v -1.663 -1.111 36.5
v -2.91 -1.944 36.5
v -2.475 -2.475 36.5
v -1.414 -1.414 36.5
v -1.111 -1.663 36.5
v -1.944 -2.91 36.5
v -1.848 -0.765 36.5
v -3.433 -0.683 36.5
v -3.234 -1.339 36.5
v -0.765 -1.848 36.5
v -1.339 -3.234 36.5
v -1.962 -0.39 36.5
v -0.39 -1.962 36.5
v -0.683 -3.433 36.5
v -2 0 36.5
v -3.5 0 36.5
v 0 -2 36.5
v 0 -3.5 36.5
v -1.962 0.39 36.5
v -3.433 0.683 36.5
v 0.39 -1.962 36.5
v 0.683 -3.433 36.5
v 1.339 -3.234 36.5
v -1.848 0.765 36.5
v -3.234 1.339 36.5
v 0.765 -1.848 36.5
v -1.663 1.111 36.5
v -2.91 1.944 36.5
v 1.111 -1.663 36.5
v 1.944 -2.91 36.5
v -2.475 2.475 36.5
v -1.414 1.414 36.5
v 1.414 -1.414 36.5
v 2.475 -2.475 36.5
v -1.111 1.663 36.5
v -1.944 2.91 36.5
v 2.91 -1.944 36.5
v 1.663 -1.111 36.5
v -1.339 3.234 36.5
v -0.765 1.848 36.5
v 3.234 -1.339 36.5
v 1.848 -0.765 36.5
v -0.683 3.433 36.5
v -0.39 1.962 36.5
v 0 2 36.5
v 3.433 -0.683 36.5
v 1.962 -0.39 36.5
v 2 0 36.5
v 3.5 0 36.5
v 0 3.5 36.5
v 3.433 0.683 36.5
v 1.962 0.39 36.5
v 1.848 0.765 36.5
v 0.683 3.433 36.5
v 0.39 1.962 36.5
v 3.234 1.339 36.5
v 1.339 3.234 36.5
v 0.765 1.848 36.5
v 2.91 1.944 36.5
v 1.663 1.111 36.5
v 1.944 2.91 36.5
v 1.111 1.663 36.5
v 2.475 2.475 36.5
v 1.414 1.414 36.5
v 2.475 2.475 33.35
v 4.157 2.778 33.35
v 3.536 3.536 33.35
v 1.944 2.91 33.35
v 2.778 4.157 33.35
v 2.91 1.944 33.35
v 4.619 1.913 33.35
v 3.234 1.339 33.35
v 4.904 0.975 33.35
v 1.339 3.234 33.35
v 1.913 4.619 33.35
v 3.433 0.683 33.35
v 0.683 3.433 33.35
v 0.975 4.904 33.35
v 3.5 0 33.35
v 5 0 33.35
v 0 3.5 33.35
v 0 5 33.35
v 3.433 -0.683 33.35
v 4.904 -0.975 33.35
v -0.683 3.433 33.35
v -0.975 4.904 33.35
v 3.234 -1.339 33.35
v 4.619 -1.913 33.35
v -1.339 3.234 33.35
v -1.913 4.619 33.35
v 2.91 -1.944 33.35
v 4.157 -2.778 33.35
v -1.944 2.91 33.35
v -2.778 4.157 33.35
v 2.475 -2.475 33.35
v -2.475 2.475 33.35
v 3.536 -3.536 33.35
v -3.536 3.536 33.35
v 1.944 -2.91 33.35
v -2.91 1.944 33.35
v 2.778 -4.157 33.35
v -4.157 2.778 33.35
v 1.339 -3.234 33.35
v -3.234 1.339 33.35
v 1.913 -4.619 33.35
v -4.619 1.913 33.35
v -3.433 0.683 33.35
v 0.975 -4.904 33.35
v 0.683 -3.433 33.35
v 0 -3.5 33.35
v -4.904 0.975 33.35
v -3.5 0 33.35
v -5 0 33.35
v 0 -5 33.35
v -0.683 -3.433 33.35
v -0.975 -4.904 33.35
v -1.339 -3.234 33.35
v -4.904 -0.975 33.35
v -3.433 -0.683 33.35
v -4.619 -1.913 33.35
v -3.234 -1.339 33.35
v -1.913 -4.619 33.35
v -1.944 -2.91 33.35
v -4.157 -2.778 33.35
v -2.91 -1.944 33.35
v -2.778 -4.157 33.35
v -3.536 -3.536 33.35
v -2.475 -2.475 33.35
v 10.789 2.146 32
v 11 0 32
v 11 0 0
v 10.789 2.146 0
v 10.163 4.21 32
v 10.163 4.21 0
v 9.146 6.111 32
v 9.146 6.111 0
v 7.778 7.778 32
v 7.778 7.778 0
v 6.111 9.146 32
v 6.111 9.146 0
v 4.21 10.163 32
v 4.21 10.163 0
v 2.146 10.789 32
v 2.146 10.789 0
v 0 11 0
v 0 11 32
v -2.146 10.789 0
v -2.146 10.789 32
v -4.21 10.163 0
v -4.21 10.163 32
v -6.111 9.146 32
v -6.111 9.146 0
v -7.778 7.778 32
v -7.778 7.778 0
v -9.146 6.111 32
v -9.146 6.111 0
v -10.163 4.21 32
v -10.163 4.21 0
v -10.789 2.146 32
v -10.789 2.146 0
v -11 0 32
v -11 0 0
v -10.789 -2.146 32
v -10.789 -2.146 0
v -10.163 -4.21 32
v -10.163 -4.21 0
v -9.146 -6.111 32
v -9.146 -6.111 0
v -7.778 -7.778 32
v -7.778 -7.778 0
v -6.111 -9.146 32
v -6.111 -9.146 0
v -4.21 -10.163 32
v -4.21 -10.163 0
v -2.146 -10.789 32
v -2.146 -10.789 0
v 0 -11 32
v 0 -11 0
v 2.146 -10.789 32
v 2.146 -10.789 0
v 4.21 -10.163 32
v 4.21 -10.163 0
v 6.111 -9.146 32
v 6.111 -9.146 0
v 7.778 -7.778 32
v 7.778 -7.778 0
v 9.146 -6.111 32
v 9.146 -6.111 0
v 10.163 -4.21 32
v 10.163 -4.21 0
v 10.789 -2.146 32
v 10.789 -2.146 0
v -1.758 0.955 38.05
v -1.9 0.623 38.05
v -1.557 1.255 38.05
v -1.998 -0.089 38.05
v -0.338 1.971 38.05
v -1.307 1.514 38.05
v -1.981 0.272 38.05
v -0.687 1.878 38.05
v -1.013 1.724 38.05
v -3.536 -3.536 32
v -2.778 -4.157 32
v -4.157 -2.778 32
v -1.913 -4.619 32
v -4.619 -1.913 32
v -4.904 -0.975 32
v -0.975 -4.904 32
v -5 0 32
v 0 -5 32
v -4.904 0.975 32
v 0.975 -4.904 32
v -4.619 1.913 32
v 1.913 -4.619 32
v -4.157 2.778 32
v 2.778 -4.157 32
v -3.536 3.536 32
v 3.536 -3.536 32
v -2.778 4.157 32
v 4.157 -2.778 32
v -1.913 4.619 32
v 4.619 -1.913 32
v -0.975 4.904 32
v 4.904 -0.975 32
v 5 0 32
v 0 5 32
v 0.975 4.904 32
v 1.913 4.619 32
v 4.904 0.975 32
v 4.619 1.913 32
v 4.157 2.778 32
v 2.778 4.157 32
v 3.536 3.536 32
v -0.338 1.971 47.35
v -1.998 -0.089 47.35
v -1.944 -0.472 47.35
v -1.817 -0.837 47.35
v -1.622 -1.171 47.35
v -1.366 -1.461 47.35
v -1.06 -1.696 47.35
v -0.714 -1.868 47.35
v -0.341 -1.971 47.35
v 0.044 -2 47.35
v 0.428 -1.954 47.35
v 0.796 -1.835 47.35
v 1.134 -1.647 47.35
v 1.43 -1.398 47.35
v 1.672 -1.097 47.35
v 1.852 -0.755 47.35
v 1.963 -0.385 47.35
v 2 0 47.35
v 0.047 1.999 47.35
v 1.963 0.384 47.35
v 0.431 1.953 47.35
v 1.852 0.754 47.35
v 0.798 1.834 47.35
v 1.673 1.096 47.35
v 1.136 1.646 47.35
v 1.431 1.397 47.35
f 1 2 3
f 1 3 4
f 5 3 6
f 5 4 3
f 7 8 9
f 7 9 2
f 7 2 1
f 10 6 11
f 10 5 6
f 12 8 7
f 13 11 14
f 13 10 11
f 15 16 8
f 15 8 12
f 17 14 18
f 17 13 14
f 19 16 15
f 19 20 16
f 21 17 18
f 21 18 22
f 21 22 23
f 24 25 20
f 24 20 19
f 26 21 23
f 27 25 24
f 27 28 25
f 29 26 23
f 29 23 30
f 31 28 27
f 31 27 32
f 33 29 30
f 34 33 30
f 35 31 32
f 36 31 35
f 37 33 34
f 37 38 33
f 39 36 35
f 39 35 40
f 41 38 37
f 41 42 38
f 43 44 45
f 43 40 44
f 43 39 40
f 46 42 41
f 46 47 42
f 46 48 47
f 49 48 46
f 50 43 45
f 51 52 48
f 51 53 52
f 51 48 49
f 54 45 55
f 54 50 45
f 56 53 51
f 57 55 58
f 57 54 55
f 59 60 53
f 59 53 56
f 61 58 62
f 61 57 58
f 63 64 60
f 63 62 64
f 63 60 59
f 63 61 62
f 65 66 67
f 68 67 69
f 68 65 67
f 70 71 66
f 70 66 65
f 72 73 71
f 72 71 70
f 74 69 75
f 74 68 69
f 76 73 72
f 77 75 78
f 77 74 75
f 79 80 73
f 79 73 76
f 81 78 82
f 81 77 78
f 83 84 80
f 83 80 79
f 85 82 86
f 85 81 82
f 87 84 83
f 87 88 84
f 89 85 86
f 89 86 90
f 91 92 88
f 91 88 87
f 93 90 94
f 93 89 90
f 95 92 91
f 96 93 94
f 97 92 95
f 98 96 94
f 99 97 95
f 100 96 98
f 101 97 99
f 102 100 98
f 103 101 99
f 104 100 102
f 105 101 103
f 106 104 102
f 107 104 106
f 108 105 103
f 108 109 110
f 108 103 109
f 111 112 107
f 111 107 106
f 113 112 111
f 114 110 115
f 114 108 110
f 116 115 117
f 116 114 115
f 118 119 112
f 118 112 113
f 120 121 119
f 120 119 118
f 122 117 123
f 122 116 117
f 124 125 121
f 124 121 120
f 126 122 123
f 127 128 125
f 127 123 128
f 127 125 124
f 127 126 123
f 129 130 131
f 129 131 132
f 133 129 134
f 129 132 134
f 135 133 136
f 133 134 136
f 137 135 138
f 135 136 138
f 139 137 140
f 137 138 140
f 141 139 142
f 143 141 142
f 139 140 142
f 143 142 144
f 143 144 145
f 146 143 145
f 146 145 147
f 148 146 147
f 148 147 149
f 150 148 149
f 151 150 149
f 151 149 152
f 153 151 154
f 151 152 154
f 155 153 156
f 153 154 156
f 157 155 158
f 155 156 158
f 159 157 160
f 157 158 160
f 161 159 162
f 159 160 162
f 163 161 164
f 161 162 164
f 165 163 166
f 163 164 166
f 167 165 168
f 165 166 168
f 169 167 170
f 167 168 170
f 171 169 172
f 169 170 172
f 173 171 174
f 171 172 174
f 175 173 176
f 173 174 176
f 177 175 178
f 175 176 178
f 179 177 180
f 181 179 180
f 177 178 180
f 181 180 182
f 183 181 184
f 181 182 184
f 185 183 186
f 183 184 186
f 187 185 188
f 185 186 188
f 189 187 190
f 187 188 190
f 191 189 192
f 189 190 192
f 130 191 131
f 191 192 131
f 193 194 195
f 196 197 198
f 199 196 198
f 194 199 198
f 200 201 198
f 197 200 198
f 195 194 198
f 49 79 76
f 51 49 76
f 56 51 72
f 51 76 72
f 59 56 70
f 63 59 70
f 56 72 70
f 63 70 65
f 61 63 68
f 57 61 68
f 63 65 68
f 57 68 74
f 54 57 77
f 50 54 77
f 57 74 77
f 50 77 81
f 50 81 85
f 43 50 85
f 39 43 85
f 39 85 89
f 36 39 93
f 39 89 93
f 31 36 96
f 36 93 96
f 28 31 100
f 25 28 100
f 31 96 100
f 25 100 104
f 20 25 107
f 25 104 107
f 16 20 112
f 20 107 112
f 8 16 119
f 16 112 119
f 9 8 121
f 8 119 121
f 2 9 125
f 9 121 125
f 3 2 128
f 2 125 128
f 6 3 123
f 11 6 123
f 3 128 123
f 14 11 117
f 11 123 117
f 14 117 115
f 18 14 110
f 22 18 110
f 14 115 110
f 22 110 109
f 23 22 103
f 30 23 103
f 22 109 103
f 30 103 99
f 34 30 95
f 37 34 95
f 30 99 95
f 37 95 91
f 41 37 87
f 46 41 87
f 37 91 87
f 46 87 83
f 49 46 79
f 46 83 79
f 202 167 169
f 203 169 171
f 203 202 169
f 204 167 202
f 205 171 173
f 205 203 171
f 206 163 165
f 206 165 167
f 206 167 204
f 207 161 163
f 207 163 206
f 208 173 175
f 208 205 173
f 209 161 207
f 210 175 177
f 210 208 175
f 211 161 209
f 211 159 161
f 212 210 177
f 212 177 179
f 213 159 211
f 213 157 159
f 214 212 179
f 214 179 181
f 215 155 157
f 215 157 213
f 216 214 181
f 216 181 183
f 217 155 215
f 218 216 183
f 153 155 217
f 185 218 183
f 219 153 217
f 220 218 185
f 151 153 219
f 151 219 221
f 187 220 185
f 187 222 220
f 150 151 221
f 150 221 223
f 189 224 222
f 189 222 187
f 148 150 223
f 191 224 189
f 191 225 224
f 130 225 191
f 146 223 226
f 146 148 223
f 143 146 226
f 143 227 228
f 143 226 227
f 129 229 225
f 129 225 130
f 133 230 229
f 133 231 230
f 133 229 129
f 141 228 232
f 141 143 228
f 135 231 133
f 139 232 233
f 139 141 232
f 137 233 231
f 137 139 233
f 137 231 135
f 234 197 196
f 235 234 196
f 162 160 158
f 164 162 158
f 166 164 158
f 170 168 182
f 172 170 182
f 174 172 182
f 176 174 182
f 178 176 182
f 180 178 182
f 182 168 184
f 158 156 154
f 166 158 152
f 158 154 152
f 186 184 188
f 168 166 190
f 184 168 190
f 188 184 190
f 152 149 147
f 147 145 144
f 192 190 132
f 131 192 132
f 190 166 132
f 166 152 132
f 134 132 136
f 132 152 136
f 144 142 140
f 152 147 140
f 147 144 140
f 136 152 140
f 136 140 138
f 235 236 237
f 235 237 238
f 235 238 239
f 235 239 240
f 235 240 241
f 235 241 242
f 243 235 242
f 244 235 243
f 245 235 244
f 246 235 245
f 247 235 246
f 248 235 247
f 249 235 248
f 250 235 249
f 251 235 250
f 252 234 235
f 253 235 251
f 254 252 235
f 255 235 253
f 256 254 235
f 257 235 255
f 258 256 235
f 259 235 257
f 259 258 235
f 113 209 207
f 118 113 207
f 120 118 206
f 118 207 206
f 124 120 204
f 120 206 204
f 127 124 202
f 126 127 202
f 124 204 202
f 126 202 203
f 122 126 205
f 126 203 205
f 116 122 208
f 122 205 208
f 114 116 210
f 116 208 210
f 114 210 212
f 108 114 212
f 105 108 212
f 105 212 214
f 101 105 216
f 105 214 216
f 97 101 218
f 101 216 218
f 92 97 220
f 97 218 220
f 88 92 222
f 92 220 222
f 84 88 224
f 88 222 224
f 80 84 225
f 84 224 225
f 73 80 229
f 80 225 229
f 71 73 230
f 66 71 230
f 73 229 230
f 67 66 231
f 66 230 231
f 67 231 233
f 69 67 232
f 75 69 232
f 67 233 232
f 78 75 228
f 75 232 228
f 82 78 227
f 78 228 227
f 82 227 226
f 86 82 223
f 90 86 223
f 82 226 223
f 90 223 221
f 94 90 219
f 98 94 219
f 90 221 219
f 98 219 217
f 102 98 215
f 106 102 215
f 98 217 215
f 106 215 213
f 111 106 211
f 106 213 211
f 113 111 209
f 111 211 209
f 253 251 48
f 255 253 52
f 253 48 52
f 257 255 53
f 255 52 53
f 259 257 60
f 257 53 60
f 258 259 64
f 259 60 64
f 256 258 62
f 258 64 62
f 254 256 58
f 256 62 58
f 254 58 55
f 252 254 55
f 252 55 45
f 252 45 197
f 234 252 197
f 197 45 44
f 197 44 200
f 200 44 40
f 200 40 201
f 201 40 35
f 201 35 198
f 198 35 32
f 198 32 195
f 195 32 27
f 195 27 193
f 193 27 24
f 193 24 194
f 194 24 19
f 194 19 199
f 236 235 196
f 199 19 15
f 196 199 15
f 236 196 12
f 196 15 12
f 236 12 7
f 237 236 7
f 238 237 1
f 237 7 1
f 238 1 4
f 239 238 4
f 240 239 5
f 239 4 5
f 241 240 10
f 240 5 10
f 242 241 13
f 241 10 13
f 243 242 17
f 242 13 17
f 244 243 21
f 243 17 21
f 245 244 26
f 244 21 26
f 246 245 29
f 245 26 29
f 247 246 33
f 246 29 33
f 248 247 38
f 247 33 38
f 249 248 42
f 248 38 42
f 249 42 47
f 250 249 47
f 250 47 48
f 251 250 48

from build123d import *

# Parameters (mm, degrees)
SKETCH1_R           = 11
BOSS_EXTRUDE1_DEPTH = 32
SKETCH2_R           = 5
BOSS_EXTRUDE2_DEPTH = 1.35
SKETCH3_R           = 3.5
BOSS_EXTRUDE4_DEPTH = 3.15
SKETCH4_R           = 2
BOSS_EXTRUDE5_DEPTH = 10.85
CUT_EXTRUDE1_START  = -9.3
CUT_EXTRUDE1_DEPTH  = 9.3


with BuildPart() as part:
    # Sketch1 → Boss-Extrude1 (new body)
    with BuildSketch(Plane.XY):
        Circle(SKETCH1_R)
    extrude(amount=BOSS_EXTRUDE1_DEPTH)

    # Sketch2 → Boss-Extrude2 (add)
    with BuildSketch(Plane.XY.offset(32)):
        with Locations(Location((0, 0, 0), (0, 0, 180))):
            Circle(SKETCH2_R)
    extrude(amount=BOSS_EXTRUDE2_DEPTH)

    # Sketch3 → Boss-Extrude4 (add)
    with BuildSketch(Plane.XY.offset(33.35)):
        Circle(SKETCH3_R)
    extrude(amount=BOSS_EXTRUDE4_DEPTH)

    # Sketch4 → Boss-Extrude5 (add)
    with BuildSketch(Plane.XY.offset(36.5)):
        Circle(SKETCH4_R)
    extrude(amount=BOSS_EXTRUDE5_DEPTH)

    # Sketch5 → Cut-Extrude1 (cut)
    with BuildSketch(Plane.XY.offset(47.35).offset(CUT_EXTRUDE1_START)):
        with BuildLine():
            Line((-0.338013059, 1.971229863), (-1.99802063, -0.088958203))
            ThreePointArc((-1.99802063, -0.088958203), (-1.557355793, 1.254847773), (-0.338013059, 1.971229863))
        make_face()
    extrude(amount=CUT_EXTRUDE1_DEPTH, mode=Mode.SUBTRACT)


solid = part.part
